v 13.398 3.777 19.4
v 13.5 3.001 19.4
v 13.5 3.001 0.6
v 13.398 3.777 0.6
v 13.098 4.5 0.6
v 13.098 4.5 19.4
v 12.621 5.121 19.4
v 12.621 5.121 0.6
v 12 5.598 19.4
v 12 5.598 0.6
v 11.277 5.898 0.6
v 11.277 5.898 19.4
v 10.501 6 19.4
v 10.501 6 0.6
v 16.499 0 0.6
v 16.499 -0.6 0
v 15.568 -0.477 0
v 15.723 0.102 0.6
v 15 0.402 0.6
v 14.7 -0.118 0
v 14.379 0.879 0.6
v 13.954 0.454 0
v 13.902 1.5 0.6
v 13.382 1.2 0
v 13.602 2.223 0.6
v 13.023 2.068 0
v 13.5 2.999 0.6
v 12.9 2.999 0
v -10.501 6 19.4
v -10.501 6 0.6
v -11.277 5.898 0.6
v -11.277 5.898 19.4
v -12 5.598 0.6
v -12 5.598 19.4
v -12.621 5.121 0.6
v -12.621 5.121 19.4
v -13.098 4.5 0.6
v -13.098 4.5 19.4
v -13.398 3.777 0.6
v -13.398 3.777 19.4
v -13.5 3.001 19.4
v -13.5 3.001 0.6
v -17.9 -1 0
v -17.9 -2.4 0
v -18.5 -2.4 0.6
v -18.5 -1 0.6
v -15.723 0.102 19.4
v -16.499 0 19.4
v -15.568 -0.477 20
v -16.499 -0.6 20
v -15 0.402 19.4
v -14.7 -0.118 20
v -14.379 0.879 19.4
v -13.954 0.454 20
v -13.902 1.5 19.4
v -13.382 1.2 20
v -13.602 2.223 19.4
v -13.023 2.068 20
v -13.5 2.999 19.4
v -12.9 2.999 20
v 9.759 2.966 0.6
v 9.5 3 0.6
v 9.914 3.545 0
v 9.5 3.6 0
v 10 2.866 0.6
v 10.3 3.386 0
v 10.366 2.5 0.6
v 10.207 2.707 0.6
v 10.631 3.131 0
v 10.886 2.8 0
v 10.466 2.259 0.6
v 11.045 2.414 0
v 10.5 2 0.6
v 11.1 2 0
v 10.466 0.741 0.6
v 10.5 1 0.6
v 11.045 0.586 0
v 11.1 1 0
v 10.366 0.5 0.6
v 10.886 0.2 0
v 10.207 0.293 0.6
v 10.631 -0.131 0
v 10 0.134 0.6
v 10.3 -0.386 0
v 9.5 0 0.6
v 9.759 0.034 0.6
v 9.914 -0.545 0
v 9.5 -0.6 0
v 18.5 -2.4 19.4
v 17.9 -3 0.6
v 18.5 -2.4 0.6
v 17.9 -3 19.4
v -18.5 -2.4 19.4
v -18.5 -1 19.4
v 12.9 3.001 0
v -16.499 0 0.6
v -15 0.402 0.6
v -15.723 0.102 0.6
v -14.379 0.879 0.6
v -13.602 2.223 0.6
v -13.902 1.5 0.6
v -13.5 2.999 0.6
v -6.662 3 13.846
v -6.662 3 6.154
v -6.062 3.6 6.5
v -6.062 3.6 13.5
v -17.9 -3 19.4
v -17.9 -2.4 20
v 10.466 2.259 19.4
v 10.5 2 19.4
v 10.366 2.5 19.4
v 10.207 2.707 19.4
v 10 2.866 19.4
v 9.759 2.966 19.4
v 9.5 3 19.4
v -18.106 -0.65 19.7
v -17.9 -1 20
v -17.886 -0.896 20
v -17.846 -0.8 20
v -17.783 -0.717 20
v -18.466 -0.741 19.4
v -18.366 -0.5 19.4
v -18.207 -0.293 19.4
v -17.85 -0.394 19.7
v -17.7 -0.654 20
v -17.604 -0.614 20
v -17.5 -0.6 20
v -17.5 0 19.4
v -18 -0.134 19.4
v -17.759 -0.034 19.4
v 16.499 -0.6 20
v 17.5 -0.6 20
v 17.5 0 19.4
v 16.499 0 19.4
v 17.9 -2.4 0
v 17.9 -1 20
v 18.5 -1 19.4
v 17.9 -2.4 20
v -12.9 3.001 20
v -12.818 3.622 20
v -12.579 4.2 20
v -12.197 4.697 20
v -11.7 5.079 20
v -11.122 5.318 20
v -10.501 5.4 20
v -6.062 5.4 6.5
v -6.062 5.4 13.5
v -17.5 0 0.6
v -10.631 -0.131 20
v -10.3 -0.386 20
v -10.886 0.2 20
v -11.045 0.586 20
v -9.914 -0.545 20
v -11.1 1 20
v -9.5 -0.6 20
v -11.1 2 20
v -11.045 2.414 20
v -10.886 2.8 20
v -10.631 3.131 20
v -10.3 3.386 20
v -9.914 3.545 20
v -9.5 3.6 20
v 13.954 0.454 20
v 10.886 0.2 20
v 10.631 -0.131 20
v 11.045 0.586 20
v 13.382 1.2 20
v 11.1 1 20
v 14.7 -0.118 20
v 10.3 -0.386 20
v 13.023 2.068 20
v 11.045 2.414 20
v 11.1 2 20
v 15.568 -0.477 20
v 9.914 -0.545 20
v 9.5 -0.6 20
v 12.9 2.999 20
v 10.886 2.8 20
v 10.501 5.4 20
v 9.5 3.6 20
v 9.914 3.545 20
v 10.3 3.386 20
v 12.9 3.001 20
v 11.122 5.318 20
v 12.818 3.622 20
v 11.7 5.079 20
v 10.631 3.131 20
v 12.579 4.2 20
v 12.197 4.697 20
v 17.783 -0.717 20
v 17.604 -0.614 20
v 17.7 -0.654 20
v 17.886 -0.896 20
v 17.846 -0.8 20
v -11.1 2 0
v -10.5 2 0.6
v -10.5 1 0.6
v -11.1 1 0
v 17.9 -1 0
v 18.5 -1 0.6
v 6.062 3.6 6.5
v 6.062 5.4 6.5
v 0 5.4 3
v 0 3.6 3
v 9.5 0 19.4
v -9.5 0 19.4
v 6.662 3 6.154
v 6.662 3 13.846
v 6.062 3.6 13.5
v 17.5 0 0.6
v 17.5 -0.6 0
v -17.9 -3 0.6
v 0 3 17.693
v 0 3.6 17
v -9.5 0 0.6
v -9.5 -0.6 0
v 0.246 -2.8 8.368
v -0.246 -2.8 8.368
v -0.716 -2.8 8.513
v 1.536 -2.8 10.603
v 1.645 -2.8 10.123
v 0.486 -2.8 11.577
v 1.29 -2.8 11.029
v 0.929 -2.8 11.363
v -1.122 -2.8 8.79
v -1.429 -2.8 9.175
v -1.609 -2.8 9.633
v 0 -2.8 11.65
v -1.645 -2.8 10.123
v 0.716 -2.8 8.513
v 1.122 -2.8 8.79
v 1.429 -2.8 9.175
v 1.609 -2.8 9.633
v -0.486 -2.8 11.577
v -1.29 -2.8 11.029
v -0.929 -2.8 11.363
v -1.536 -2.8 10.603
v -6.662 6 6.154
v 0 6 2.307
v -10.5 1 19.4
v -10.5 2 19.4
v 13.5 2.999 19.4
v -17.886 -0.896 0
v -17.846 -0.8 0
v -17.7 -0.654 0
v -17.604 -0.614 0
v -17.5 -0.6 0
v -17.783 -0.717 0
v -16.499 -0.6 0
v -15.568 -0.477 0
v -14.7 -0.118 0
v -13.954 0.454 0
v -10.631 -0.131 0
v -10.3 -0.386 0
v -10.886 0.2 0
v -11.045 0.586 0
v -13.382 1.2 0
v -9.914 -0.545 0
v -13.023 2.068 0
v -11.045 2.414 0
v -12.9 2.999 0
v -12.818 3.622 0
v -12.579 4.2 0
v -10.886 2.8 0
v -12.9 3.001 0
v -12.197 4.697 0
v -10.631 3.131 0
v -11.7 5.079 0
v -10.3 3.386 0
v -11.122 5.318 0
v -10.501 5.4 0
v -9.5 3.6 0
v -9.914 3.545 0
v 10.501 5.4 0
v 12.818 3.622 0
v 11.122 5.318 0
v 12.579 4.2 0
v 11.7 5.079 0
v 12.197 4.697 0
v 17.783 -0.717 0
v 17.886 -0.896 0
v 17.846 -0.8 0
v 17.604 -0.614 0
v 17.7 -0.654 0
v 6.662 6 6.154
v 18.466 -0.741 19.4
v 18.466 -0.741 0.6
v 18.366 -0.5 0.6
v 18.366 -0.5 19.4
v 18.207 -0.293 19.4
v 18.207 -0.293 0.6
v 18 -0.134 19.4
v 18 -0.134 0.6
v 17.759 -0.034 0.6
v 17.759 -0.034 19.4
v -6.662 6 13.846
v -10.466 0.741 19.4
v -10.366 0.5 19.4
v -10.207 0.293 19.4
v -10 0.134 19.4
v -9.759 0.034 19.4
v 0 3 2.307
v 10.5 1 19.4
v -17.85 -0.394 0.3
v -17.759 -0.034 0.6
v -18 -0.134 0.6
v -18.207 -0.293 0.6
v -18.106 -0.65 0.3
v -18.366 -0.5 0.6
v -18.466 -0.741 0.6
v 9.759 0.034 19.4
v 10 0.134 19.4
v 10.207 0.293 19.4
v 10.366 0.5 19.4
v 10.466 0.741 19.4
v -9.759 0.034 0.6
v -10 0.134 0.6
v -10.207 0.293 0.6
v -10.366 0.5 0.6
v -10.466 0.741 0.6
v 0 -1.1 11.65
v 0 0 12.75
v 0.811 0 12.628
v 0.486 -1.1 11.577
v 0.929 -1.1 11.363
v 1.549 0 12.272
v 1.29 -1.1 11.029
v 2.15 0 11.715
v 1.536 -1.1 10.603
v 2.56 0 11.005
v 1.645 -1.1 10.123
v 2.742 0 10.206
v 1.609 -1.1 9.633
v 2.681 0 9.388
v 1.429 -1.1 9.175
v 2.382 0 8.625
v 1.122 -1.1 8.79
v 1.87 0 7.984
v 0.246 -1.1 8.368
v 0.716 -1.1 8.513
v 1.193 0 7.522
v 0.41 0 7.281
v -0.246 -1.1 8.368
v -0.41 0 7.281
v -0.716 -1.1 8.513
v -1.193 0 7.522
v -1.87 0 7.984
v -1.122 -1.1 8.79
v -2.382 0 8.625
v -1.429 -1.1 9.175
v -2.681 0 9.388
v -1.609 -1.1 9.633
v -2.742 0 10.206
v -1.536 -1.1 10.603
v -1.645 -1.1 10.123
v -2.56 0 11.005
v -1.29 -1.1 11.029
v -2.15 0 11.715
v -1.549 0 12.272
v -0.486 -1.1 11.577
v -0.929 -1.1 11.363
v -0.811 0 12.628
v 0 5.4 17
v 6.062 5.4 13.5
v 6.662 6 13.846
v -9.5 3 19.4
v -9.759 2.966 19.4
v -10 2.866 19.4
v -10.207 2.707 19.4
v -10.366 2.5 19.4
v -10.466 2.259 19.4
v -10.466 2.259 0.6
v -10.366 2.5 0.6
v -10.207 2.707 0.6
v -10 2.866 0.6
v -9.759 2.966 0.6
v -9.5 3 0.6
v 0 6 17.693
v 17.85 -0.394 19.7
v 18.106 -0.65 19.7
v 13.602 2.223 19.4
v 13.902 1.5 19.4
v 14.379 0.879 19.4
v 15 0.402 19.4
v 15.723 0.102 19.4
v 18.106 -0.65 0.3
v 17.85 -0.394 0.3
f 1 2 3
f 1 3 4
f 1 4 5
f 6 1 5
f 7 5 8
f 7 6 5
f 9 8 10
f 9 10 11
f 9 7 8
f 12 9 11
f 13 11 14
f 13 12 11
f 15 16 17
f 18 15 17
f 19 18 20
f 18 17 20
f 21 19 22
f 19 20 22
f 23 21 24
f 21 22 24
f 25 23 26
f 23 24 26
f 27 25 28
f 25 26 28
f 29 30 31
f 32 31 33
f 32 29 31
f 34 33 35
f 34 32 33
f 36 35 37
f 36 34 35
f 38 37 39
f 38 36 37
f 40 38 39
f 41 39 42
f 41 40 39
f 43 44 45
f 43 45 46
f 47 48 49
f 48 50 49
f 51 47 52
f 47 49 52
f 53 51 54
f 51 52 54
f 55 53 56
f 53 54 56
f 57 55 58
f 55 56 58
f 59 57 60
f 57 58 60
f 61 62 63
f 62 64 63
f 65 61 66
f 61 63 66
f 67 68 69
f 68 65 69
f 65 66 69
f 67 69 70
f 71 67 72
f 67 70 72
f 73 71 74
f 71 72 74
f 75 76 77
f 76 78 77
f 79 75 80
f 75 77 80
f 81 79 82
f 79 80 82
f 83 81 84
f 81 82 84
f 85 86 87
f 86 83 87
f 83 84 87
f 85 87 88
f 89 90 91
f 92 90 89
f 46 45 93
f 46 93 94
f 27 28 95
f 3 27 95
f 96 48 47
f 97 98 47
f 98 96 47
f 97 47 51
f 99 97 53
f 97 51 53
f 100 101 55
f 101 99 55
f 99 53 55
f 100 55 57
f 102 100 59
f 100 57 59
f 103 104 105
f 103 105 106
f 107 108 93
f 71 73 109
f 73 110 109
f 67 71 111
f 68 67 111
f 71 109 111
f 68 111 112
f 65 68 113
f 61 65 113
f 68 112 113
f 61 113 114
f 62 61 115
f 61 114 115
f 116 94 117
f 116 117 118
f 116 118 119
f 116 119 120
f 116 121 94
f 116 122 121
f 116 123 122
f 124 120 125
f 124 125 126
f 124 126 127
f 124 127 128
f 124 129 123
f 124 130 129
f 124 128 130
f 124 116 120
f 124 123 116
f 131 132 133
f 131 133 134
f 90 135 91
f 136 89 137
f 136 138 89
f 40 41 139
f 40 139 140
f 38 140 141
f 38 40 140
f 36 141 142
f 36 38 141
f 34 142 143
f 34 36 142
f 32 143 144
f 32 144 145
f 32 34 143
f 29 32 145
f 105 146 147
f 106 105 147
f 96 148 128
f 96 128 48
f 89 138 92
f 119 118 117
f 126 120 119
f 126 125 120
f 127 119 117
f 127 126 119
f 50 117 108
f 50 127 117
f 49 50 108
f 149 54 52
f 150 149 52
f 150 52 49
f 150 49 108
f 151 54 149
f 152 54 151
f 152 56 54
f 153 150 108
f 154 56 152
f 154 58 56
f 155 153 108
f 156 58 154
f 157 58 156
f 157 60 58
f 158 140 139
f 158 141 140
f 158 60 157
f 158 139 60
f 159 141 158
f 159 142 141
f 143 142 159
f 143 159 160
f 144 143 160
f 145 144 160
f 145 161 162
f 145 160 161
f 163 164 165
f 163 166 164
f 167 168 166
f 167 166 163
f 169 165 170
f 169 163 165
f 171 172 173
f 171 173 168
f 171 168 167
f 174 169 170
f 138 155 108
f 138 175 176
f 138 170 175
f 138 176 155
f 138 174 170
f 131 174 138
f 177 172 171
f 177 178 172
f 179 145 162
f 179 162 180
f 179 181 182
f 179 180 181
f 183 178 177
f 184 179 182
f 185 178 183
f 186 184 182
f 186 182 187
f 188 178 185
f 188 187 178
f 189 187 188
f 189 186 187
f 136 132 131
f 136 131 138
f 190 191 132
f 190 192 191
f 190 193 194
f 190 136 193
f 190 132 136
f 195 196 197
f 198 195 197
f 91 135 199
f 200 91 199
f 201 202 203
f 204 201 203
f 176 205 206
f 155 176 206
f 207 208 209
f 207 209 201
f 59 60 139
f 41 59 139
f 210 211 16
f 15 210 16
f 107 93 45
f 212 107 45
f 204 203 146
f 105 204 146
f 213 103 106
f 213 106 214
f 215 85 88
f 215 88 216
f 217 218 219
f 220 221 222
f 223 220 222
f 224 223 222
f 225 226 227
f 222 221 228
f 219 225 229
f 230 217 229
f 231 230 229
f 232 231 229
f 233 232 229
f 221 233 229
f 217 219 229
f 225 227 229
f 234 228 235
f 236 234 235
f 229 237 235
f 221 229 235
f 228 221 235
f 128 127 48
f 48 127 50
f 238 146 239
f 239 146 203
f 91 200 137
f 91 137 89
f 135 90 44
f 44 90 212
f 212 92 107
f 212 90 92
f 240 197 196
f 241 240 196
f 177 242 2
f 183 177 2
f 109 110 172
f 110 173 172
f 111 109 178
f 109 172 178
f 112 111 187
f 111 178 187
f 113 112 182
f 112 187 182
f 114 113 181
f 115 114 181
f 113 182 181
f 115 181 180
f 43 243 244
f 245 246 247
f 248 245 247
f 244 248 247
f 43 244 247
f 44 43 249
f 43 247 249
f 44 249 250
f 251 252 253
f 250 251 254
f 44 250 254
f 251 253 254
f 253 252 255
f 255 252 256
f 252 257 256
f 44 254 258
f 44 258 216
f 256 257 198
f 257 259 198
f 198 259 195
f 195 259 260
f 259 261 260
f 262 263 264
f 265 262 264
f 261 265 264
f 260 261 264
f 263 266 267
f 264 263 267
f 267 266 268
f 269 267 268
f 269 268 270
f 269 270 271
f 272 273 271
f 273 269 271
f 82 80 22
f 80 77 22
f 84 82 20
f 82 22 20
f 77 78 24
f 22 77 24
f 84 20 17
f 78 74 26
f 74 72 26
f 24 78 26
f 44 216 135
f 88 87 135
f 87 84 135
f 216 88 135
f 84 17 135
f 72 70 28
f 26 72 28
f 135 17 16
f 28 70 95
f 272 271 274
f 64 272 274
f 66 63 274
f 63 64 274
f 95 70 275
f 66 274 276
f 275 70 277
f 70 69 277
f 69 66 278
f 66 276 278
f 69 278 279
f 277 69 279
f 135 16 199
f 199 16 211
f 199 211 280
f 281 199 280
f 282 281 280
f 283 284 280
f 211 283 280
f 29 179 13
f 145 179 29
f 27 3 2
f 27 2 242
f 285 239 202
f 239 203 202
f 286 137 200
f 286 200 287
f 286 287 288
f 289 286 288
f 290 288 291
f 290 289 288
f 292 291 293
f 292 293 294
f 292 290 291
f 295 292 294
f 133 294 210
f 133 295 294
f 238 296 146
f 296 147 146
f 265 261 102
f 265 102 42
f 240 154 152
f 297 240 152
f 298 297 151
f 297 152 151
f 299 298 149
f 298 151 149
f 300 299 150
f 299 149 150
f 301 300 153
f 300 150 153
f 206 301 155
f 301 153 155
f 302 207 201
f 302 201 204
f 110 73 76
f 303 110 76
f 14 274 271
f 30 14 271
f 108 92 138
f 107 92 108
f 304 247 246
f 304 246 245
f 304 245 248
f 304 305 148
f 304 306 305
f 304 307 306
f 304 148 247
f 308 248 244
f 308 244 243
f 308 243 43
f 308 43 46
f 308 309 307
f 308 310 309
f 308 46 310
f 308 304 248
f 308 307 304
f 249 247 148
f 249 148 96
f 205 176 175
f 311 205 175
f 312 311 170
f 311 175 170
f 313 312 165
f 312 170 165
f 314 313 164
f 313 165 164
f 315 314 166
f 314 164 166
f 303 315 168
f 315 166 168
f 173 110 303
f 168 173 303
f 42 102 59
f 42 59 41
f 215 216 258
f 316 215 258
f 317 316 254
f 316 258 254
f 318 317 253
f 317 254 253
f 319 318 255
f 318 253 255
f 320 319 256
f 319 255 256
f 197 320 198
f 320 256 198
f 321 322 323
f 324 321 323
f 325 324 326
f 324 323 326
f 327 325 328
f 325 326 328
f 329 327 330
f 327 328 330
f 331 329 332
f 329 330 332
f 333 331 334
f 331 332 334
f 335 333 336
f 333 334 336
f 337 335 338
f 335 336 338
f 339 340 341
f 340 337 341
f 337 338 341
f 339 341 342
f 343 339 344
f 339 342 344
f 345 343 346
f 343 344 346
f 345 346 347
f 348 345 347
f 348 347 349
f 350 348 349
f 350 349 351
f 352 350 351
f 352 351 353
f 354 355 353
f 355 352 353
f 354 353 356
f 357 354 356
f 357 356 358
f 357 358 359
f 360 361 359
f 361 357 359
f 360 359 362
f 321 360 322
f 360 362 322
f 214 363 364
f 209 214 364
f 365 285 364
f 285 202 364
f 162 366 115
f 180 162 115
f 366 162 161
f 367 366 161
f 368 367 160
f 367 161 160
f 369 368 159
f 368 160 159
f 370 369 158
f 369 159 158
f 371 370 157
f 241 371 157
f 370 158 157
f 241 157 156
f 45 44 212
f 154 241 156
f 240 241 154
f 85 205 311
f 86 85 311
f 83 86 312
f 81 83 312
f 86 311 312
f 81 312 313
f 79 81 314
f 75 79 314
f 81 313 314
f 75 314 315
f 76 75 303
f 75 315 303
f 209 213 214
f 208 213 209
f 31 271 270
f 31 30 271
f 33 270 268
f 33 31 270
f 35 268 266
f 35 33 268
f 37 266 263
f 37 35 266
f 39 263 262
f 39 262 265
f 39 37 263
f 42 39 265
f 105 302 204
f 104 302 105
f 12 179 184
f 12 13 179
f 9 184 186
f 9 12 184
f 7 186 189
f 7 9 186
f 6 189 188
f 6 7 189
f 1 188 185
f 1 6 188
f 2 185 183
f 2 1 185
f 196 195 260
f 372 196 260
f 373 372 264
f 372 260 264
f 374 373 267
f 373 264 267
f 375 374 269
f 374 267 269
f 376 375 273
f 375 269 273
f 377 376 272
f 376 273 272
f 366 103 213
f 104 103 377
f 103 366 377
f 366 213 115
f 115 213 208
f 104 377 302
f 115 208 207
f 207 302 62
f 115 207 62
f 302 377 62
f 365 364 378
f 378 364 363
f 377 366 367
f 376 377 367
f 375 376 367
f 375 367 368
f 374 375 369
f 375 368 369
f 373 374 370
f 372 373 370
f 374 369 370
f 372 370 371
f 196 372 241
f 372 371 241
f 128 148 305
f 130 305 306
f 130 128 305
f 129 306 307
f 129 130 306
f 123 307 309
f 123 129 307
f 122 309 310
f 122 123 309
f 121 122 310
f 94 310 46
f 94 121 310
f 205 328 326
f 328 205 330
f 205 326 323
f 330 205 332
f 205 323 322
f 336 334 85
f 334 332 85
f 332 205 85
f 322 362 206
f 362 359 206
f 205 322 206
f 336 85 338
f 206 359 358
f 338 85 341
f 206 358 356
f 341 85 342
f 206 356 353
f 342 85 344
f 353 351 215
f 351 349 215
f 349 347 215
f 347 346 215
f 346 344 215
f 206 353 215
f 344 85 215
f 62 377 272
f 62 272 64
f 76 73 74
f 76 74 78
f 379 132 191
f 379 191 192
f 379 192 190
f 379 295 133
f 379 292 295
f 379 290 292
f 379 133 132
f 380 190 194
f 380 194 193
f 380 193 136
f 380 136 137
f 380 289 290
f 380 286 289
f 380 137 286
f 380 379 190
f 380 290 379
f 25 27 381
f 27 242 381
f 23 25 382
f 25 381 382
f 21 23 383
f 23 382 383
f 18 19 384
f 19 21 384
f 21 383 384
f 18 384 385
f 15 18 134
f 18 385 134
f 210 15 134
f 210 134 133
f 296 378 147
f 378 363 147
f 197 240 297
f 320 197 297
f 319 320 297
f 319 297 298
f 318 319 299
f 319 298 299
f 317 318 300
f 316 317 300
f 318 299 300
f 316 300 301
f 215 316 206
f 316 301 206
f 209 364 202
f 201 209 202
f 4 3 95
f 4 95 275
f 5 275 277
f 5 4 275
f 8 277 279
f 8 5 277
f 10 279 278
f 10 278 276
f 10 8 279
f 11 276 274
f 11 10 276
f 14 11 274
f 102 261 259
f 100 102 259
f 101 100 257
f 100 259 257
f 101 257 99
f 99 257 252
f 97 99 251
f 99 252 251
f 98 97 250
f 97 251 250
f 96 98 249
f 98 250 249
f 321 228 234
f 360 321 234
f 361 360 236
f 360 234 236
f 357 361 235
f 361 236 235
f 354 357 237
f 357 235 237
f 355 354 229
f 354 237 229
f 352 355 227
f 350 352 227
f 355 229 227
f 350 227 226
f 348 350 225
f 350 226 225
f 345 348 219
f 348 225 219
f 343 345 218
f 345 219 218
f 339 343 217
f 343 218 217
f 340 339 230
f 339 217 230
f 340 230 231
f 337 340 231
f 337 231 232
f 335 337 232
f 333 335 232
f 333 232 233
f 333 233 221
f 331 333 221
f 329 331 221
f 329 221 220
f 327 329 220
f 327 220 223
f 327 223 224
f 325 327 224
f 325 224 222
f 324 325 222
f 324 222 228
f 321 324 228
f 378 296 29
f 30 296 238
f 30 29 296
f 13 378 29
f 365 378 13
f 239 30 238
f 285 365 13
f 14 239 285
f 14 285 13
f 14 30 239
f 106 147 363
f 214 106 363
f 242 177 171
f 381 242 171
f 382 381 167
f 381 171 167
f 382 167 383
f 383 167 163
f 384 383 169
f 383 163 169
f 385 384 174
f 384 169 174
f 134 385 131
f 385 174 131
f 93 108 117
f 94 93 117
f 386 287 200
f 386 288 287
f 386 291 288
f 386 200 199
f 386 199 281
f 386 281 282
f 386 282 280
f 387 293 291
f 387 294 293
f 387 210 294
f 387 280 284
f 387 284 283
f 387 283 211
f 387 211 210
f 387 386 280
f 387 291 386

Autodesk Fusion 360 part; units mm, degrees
sketch "Sketch1" plane through (0, 0, 0) normal (0, 0, 1) x (1, 0, 0)
  line L0 (0, 3) -> (10.5, 3)
  line L1 (10.5, 3) -> (10.5, 0)
  line L2 (10.5, 0) -> (0, 0)
  line L3 (0, 6) -> (13.5, 6)
  line L4 (13.5, 6) -> (13.5, 0)
  line L5 (13.5, 0) -> (18.5, 0)
  line L6 (18.5, 0) -> (18.5, -3)
  line L7 (18.5, -3) -> (0, -3)
  line L8 (0, 6) -> (0, 3)
  line L9 (0, -3) -> (0, 0)
  dimension "d1" = 10.5
  dimension "d2" = 3
  dimension "d3" = 3
  dimension "d4" = 6
  dimension "d5" = 3
  dimension "d6" = 5
extrude "Extrude1" add sketch "Sketch1" along normal blind 20
fillet "Fillet1" radius 1 2 edges at (10.5, 3, 10) (10.5, 0, 10)
fillet "Fillet1" radius 3 2 edges at (13.5, 6, 10) (13.5, 0, 10)
fillet "Fillet1" radius 1 1 edges at (18.5, 0, 10)
mirror "Mirror1" about plane through (0, -3, 0) normal (-1, 0, 0) of bodies 1 merged
chamfer "Chamfer1" distance 0.6 angle 45 2 faces at (-3.1667, -2, 20) (-3.1667, -2, 0)
chamfer "Chamfer1" distance 0.6 angle 45 2 edges at (18.5, -3, 10) (-18.5, -3, 10)
sketch "Sketch2" plane through (0, 6, 0) normal (0, 1, 0) x (-1, 0, 0)
  line L0 (10.5, 19.4) -> (-10.5, 19.4)
  line L1 (-10.5, 19.4) -> (-10.5, 0.6)
  line L2 (-10.5, 0.6) -> (10.5, 0.6)
  line L3 (10.5, 0.6) -> (10.5, 19.4)
  line L4 (-10.5, 0.6) -> (10.5, 19.4) construction
  line L5 (-6.0622, 13.5) -> (-6.0622, 6.5)
  line L6 (-6.0622, 6.5) -> (0, 3)
  line L7 (0, 3) -> (6.0622, 6.5)
  line L8 (6.0622, 6.5) -> (6.0622, 13.5)
  line L9 (6.0622, 13.5) -> (0, 17)
  line L10 (0, 17) -> (-6.0622, 13.5)
  point P0 (0, 10)
  point P1 (0, 10)
  dimension "d19" = 7
extrude "Extrude2" cut sketch "Sketch2" against normal up to surface (3 mm away) contours L5 L6 L7 L8 L9 L10
chamfer "Chamfer2" distance 0.6 angle 45 12 edges at (-3.0311, 6, 4.75) (-6.0622, 6, 10) (-3.0311, 6, 15.25) (3.0311, 6, 15.25) (6.0622, 6, 10) (3.0311, 6, 4.75) (-3.0311, 3, 4.75) (3.0311, 3, 4.75) (6.0622, 3, 10) (3.0311, 3, 15.25) (-3.0311, 3, 15.25) (-6.0622, 3, 10)
hole "Hole1" at (0, 0, 10) direction (0, -1, 0) diameter 3.3 depth 2.8 tip angle 180 countersink diameter 5.5 countersink angle 90
equation "d1 = ( 21 / 2 ) * 1 mm"
equation "d3 = d2"
equation "d4 = 2 * d2"
equation "d5 = d2"
